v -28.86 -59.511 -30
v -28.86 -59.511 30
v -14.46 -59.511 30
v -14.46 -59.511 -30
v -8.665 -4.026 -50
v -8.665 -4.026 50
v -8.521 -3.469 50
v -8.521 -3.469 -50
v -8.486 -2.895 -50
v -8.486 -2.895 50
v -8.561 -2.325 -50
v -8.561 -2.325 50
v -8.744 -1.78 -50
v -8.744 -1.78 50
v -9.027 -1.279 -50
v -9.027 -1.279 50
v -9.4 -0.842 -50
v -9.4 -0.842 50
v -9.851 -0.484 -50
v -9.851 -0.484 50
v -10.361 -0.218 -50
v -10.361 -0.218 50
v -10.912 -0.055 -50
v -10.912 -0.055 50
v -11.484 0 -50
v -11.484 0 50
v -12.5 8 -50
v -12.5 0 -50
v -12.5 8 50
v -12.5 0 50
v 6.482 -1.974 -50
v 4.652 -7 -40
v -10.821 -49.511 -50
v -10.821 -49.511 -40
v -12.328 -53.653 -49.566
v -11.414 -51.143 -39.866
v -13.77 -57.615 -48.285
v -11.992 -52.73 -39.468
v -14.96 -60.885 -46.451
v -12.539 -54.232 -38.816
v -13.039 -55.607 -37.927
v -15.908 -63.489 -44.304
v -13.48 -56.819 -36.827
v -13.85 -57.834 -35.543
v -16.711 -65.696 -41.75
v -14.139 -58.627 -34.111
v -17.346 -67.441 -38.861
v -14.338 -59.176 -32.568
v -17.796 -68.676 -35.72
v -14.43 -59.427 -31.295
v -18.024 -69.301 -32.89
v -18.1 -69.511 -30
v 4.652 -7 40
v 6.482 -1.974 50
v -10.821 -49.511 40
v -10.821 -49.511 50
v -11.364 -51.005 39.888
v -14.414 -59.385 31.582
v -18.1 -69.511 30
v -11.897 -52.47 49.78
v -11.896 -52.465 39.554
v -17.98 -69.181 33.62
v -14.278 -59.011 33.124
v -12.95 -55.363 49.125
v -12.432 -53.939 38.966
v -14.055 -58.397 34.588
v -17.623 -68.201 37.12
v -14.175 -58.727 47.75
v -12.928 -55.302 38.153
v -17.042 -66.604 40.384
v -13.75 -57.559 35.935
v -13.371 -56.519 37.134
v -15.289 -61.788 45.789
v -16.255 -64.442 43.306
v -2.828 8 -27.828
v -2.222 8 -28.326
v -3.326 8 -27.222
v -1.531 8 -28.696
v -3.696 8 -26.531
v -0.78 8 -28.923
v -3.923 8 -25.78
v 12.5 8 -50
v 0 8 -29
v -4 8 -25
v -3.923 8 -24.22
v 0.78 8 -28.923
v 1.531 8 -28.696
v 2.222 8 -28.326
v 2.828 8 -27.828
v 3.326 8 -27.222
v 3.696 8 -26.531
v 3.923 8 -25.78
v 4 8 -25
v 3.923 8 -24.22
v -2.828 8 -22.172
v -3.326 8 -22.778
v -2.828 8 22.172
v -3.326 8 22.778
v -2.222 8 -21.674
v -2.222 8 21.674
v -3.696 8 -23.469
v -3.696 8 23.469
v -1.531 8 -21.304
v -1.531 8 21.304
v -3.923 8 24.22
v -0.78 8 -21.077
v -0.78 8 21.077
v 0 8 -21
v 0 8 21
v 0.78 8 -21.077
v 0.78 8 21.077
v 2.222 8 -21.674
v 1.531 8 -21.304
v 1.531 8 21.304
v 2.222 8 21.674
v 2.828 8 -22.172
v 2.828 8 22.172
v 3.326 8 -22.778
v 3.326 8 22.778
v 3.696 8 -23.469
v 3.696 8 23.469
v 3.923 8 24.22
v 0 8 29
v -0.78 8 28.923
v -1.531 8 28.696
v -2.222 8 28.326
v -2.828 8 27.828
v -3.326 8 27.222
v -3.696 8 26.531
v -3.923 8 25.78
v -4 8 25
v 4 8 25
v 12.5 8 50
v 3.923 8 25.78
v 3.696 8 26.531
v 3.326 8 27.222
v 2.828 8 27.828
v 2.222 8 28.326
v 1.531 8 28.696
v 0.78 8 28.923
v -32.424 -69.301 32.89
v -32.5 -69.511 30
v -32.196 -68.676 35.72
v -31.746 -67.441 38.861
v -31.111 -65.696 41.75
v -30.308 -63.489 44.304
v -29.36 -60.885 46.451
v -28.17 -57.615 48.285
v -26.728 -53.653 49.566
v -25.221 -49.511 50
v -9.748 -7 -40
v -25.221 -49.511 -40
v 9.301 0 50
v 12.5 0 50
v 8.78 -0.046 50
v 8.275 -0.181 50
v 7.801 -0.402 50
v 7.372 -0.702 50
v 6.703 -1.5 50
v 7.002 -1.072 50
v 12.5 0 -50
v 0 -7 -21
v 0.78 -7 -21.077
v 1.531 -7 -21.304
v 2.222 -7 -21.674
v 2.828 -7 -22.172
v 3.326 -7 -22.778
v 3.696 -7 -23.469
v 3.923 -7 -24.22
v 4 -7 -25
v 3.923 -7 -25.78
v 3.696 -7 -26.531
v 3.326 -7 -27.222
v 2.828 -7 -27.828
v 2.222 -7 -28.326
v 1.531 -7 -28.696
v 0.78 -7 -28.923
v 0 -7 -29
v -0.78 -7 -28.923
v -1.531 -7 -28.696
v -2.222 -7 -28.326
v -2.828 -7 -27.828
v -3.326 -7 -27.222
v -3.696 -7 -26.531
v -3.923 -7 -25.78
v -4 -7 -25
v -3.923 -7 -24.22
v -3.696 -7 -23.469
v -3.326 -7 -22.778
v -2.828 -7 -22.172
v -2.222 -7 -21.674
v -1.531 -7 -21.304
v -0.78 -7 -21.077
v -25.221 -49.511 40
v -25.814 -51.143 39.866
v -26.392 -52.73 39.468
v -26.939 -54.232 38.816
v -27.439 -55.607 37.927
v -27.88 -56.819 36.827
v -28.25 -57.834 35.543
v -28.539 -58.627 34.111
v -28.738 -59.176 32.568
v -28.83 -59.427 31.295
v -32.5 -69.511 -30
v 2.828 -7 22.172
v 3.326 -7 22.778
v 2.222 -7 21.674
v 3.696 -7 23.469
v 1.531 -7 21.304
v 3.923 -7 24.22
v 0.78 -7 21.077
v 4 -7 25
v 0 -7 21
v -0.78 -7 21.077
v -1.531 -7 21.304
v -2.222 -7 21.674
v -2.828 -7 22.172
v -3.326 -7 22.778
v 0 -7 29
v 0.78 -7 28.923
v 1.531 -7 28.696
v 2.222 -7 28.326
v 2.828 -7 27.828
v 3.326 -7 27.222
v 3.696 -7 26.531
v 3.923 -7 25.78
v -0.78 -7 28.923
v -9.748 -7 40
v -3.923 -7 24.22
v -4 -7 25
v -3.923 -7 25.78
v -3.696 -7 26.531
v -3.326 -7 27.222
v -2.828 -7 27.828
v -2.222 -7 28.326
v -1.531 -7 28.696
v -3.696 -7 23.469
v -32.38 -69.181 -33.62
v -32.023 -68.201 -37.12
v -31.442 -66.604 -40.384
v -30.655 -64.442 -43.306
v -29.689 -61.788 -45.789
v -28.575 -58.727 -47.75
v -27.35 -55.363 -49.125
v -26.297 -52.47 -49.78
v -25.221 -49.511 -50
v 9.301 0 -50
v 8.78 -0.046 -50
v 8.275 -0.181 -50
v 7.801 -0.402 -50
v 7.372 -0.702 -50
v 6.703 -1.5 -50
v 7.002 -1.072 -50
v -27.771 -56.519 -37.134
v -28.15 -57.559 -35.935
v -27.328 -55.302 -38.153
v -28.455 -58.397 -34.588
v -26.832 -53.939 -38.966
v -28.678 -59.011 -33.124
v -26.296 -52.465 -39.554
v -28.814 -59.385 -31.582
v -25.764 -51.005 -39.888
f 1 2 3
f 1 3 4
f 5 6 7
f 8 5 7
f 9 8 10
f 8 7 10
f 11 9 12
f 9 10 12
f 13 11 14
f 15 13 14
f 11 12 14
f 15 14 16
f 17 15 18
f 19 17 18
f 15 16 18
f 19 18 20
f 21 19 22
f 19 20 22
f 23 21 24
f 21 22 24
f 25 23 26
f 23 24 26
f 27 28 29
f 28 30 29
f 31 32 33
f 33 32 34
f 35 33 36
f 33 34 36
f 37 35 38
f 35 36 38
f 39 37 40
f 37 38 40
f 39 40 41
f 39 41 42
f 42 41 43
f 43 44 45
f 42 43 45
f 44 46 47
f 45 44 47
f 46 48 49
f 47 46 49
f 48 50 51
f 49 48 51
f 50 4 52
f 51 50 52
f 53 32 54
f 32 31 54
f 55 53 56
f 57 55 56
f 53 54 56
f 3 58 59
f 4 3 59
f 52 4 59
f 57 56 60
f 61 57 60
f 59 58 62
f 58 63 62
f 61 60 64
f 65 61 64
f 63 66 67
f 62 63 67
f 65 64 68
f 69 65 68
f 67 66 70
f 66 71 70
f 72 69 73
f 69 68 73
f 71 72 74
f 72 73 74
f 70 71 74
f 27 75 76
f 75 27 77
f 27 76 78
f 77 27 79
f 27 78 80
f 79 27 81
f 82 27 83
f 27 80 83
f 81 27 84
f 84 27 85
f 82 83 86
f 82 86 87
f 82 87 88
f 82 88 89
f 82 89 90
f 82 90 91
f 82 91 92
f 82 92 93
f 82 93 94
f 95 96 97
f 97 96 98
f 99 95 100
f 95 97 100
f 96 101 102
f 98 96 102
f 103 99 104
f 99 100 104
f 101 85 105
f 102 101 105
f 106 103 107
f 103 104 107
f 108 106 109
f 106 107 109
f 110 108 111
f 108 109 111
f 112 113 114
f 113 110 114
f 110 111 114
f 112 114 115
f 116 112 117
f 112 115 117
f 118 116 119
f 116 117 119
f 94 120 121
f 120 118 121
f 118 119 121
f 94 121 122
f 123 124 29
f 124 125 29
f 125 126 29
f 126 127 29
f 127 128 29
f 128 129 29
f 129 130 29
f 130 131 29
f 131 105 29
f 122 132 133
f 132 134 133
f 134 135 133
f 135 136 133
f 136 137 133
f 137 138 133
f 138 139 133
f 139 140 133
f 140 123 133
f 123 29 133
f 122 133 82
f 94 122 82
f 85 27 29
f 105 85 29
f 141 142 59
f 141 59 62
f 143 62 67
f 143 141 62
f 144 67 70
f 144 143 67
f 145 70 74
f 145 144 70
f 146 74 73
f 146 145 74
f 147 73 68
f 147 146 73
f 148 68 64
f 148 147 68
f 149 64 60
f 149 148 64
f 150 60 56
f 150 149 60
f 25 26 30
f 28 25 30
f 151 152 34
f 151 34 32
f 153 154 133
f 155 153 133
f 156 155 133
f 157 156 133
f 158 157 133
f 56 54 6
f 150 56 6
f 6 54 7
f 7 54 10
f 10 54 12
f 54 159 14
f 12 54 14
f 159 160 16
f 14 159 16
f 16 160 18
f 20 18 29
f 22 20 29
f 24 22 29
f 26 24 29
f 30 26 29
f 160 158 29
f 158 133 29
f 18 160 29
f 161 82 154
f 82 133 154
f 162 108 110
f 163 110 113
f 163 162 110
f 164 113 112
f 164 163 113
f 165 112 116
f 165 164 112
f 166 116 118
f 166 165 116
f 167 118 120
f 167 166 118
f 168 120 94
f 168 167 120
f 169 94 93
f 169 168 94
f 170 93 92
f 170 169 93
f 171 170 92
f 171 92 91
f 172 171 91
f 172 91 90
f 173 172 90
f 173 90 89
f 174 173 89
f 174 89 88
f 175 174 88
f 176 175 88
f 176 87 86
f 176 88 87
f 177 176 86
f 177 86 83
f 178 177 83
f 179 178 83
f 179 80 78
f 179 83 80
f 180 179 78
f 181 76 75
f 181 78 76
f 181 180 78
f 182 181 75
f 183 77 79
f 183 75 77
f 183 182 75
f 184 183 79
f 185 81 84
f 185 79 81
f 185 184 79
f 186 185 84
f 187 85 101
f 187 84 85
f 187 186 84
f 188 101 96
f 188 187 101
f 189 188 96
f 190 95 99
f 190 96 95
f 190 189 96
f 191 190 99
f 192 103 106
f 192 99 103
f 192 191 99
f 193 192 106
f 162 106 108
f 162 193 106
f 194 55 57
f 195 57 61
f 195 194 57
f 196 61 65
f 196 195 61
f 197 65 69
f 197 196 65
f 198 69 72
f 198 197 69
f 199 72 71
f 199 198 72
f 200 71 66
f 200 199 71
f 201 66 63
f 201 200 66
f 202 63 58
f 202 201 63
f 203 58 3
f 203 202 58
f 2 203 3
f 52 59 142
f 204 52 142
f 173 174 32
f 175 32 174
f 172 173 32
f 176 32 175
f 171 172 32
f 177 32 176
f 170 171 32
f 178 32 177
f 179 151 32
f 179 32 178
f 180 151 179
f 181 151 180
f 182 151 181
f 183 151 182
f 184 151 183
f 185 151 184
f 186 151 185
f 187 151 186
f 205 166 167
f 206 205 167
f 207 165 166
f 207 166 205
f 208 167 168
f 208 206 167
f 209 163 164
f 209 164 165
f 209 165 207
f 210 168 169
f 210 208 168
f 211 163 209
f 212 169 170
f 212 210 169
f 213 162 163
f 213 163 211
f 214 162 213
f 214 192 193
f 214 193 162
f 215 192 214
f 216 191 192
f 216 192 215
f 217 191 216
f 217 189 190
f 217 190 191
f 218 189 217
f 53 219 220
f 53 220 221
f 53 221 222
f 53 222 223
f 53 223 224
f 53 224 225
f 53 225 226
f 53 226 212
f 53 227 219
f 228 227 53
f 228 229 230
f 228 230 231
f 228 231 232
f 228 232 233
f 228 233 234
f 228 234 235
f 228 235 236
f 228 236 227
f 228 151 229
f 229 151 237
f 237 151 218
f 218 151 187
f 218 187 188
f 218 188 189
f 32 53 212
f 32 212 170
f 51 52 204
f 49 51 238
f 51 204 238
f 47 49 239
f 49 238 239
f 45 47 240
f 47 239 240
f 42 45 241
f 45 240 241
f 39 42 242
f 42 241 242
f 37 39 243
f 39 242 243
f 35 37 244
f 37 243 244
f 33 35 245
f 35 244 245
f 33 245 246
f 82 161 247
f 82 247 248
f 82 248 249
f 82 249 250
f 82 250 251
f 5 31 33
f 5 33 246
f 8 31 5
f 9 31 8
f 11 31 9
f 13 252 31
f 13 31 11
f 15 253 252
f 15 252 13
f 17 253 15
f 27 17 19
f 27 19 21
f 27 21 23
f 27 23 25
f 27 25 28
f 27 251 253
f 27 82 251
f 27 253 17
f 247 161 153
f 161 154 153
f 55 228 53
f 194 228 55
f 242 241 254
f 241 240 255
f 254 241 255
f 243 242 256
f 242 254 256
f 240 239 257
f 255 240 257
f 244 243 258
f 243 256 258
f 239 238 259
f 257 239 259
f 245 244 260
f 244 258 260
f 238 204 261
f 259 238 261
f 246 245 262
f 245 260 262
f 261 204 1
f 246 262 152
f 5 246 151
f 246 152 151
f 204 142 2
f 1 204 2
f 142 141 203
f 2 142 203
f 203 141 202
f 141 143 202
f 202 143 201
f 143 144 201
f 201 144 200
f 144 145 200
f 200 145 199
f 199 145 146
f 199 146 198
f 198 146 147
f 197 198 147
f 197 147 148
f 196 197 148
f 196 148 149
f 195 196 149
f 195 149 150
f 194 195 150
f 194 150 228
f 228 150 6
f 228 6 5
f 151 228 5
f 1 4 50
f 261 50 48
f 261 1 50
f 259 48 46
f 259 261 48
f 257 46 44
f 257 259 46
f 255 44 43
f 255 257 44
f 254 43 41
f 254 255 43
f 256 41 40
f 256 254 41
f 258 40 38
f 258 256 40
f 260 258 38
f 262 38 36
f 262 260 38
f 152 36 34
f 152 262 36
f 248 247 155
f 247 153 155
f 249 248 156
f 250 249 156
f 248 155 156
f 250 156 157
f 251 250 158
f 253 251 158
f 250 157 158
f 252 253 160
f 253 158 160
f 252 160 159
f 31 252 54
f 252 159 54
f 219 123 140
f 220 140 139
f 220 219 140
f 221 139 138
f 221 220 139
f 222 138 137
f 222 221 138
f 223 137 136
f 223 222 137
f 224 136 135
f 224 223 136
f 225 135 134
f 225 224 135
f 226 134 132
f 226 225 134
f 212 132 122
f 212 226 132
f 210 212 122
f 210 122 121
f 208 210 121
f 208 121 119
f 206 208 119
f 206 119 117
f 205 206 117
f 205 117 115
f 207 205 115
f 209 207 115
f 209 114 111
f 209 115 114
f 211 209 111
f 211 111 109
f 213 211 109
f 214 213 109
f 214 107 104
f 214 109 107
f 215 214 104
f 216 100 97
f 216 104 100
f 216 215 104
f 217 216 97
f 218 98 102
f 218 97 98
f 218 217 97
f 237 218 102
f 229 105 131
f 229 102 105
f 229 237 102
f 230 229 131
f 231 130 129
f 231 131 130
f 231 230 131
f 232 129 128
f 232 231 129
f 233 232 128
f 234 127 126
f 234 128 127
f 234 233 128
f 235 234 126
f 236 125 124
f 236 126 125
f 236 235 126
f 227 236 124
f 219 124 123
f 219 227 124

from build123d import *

# Parameters (mm, degrees)
BOSS_EXTRUDE1_DEPTH     = 50
CUT_EXTRUDE1_DEPTH      = 92.586319753
CUT_EXTRUDE1_DEPTH_BACK = 92.586319753
CUT_EXTRUDE2_DEPTH      = 98.796895786
CUT_EXTRUDE2_DEPTH_BACK = 15
SKETCH3_R               = 4


with BuildPart() as part:
    # Sketch1 → Boss-Extrude1 (new, symmetric)
    with BuildSketch(Plane.XY):
        with BuildLine():
            Line((-11.48444402, 0), (-12.5, 0))
            Line((-12.5, 0), (-12.5, 8))
            Line((-12.5, 8), (12.5, 8))
            Line((12.5, 8), (12.5, 0))
            Line((12.5, 0), (9.300622615, 0))
            ThreePointArc((9.300622615, 0), (7.579893306, -0.542543867), (6.481544752, -1.97393957))
            Line((6.481544752, -1.97393957), (-18.1, -69.511178712))
            Line((-18.1, -69.511178712), (-32.5, -69.511178712))
            Line((-32.5, -69.511178712), (-8.665366158, -4.02606043))
            ThreePointArc((-8.665366158, -4.02606043), (-9.026987887, -1.279270691), (-11.48444402, 0))
        make_face()
    extrude(amount=BOSS_EXTRUDE1_DEPTH, both=True)

    # Sketch2 → Cut-Extrude1 (cut, two sides: drawn at the far end of the back side and taken through both)
    with BuildSketch(Plane(origin=(0, 0, 0), x_dir=(0, 0, -1), z_dir=(1, 0, 0)).offset(-CUT_EXTRUDE1_DEPTH_BACK)):
        with BuildLine():
            Line((40, -7), (-40, -7))
            Line((-40, -7), (-40, -49.511178712))
            ThreePointArc((-40, -49.511178712), (-37.071067812, -56.582246524), (-30, -59.511178712))
            Line((-30, -59.511178712), (30, -59.511178712))
            ThreePointArc((30, -59.511178712), (37.071067812, -56.582246524), (40, -49.511178712))
            Line((40, -49.511178712), (40, -7))
        make_face()
        with BuildLine():
            Line((-50, -49.511178712), (-50, -69.511178712))
            Line((-50, -69.511178712), (-30, -69.511178712))
            ThreePointArc((-30, -69.511178712), (-44.142135624, -63.653314336), (-50, -49.511178712))
        make_face()
        with BuildLine():
            Line((50, -49.511178712), (50, -69.511178712))
            Line((50, -69.511178712), (30, -69.511178712))
            ThreePointArc((30, -69.511178712), (44.142135624, -63.653314336), (50, -49.511178712))
        make_face()
    extrude(amount=CUT_EXTRUDE1_DEPTH + CUT_EXTRUDE1_DEPTH_BACK, mode=Mode.SUBTRACT)

    # Sketch3 → Cut-Extrude2 (cut, two sides: drawn at the far end of the back side and taken through both)
    with BuildSketch(Plane(origin=(0, 8, 0), x_dir=(1, 0, 0), z_dir=(0, 1, 0)).offset(-CUT_EXTRUDE2_DEPTH_BACK)):
        with Locations(Location((0, -25, 0), (0, 0, 270))):
            Circle(SKETCH3_R)
        with Locations(Location((0, 25, 0), (0, 0, 270))):
            Circle(SKETCH3_R)
    extrude(amount=CUT_EXTRUDE2_DEPTH + CUT_EXTRUDE2_DEPTH_BACK, mode=Mode.SUBTRACT)


solid = part.part
